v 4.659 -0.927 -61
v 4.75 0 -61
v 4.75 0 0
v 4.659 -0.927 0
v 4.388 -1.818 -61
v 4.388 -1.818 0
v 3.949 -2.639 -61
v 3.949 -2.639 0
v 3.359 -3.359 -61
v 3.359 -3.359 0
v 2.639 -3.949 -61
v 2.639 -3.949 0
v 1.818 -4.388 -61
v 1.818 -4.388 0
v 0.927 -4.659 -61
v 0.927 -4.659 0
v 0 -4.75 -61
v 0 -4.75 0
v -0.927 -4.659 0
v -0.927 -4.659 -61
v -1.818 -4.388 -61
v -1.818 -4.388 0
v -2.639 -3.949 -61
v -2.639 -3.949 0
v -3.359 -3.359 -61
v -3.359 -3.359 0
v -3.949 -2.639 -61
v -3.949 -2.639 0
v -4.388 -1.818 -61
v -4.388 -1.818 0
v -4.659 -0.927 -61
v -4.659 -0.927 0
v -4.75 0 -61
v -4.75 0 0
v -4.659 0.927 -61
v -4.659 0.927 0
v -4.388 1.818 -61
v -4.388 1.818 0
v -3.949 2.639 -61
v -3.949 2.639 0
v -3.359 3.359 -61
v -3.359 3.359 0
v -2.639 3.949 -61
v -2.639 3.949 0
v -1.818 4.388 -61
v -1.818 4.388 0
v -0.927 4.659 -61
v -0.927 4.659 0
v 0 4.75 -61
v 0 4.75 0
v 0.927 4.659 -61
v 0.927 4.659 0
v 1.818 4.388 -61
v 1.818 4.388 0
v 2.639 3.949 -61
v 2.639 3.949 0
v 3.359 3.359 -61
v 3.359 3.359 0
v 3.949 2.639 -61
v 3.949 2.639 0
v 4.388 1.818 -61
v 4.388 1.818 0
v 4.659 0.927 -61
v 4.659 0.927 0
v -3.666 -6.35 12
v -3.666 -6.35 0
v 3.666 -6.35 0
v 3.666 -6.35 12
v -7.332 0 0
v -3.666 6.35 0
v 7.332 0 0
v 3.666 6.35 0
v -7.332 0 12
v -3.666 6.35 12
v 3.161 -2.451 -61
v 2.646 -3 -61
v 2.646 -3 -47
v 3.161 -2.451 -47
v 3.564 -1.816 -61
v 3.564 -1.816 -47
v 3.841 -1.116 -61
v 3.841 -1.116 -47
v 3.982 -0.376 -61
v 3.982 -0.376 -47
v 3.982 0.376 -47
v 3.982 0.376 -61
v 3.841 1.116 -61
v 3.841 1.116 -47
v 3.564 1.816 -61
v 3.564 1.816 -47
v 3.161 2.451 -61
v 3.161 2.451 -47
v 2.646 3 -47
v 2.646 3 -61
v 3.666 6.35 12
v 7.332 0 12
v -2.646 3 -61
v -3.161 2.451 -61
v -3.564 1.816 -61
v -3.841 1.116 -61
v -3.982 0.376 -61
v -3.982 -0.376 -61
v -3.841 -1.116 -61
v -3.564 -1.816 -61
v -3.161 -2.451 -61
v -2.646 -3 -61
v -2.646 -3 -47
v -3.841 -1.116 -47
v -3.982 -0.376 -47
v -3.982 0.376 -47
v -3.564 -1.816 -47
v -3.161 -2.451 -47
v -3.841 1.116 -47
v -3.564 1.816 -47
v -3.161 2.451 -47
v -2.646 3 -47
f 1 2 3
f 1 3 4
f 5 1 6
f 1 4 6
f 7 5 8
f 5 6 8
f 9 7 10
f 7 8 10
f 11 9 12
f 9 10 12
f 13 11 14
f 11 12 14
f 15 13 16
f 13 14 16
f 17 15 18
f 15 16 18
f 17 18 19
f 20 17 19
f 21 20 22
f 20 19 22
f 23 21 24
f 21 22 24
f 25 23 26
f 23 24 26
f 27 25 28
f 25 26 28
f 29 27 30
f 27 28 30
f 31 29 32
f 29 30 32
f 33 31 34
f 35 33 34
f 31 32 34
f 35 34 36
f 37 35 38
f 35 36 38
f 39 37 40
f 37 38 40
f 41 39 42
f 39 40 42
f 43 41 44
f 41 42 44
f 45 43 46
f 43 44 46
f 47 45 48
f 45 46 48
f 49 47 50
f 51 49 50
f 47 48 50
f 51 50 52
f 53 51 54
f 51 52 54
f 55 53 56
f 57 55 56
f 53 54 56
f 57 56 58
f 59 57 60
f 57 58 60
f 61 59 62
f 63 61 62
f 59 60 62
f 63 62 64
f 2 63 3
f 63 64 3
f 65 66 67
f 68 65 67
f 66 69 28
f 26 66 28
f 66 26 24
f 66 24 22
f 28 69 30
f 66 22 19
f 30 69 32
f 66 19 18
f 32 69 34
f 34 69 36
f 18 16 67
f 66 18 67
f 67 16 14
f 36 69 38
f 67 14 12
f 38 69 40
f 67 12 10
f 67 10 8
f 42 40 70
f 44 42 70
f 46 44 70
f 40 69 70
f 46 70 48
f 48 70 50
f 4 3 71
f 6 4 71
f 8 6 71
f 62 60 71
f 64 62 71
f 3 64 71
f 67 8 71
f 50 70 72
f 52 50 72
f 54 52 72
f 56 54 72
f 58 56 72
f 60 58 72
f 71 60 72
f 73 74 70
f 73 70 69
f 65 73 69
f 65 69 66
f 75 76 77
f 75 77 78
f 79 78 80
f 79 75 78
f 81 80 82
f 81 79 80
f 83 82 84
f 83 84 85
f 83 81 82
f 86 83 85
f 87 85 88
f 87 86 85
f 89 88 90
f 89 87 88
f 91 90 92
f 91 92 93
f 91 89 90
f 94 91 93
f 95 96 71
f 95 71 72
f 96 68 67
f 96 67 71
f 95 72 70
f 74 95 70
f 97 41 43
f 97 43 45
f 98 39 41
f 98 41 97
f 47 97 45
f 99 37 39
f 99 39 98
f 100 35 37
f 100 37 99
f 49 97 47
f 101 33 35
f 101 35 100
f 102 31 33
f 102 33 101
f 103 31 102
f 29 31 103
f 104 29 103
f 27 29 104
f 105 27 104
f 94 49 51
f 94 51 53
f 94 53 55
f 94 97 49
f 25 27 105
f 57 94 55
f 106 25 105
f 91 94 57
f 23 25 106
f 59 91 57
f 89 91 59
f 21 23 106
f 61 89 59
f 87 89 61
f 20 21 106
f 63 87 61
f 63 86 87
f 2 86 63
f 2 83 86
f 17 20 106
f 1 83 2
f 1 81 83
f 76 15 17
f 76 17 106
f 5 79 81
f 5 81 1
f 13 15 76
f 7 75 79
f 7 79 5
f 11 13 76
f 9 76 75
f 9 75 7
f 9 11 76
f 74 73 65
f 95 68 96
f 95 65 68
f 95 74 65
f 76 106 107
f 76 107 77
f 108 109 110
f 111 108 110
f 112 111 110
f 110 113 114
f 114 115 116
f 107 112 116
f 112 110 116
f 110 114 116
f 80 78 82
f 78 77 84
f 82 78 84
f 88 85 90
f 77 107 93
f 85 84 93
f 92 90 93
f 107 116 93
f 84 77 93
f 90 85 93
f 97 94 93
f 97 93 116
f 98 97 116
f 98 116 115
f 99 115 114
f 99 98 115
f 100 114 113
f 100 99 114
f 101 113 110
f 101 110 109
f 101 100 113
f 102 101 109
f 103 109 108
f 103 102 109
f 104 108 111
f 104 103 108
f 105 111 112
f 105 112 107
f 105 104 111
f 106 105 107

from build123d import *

# Parameters (mm, degrees)
BOSS_EXTRUDE1_DEPTH = 12
SKETCH2_R           = 4.75
BOSS_EXTRUDE2_DEPTH = 61
CUT_EXTRUDE1_DEPTH  = 14


with BuildPart() as part:
    # Sketch1 → Boss-Extrude1 (new body)
    with BuildSketch(Plane.XY):
        Polygon((3.666174209, -6.35), (7.332348419, 0), (3.666174209, 6.35), (-3.666174209, 6.35), (-7.332348419, 0), (-3.666174209, -6.35), align=None)
    extrude(amount=BOSS_EXTRUDE1_DEPTH)

    # Sketch2 → Boss-Extrude2 (add)
    with BuildSketch(Plane(origin=(0, 0, 0), x_dir=(-1, 0, 0), z_dir=(0, 0, -1))):
        with Locations(Location((0, 0, 0), (0, 0, 180))):
            Circle(SKETCH2_R)
    extrude(amount=BOSS_EXTRUDE2_DEPTH)

    # Sketch3 → Cut-Extrude1 (cut)
    with BuildSketch(Plane(origin=(0, 0, -61), x_dir=(-1, 0, 0), z_dir=(0, 0, -1))):
        with BuildLine():
            Line((-2.645751311, 3), (2.645751311, 3))
            ThreePointArc((2.645751311, 3), (4, 0), (2.645751311, -3))
            Line((2.645751311, -3), (-2.645751311, -3))
            ThreePointArc((-2.645751311, -3), (-4, 0), (-2.645751311, 3))
        make_face()
    extrude(amount=-CUT_EXTRUDE1_DEPTH, mode=Mode.SUBTRACT)


solid = part.part
